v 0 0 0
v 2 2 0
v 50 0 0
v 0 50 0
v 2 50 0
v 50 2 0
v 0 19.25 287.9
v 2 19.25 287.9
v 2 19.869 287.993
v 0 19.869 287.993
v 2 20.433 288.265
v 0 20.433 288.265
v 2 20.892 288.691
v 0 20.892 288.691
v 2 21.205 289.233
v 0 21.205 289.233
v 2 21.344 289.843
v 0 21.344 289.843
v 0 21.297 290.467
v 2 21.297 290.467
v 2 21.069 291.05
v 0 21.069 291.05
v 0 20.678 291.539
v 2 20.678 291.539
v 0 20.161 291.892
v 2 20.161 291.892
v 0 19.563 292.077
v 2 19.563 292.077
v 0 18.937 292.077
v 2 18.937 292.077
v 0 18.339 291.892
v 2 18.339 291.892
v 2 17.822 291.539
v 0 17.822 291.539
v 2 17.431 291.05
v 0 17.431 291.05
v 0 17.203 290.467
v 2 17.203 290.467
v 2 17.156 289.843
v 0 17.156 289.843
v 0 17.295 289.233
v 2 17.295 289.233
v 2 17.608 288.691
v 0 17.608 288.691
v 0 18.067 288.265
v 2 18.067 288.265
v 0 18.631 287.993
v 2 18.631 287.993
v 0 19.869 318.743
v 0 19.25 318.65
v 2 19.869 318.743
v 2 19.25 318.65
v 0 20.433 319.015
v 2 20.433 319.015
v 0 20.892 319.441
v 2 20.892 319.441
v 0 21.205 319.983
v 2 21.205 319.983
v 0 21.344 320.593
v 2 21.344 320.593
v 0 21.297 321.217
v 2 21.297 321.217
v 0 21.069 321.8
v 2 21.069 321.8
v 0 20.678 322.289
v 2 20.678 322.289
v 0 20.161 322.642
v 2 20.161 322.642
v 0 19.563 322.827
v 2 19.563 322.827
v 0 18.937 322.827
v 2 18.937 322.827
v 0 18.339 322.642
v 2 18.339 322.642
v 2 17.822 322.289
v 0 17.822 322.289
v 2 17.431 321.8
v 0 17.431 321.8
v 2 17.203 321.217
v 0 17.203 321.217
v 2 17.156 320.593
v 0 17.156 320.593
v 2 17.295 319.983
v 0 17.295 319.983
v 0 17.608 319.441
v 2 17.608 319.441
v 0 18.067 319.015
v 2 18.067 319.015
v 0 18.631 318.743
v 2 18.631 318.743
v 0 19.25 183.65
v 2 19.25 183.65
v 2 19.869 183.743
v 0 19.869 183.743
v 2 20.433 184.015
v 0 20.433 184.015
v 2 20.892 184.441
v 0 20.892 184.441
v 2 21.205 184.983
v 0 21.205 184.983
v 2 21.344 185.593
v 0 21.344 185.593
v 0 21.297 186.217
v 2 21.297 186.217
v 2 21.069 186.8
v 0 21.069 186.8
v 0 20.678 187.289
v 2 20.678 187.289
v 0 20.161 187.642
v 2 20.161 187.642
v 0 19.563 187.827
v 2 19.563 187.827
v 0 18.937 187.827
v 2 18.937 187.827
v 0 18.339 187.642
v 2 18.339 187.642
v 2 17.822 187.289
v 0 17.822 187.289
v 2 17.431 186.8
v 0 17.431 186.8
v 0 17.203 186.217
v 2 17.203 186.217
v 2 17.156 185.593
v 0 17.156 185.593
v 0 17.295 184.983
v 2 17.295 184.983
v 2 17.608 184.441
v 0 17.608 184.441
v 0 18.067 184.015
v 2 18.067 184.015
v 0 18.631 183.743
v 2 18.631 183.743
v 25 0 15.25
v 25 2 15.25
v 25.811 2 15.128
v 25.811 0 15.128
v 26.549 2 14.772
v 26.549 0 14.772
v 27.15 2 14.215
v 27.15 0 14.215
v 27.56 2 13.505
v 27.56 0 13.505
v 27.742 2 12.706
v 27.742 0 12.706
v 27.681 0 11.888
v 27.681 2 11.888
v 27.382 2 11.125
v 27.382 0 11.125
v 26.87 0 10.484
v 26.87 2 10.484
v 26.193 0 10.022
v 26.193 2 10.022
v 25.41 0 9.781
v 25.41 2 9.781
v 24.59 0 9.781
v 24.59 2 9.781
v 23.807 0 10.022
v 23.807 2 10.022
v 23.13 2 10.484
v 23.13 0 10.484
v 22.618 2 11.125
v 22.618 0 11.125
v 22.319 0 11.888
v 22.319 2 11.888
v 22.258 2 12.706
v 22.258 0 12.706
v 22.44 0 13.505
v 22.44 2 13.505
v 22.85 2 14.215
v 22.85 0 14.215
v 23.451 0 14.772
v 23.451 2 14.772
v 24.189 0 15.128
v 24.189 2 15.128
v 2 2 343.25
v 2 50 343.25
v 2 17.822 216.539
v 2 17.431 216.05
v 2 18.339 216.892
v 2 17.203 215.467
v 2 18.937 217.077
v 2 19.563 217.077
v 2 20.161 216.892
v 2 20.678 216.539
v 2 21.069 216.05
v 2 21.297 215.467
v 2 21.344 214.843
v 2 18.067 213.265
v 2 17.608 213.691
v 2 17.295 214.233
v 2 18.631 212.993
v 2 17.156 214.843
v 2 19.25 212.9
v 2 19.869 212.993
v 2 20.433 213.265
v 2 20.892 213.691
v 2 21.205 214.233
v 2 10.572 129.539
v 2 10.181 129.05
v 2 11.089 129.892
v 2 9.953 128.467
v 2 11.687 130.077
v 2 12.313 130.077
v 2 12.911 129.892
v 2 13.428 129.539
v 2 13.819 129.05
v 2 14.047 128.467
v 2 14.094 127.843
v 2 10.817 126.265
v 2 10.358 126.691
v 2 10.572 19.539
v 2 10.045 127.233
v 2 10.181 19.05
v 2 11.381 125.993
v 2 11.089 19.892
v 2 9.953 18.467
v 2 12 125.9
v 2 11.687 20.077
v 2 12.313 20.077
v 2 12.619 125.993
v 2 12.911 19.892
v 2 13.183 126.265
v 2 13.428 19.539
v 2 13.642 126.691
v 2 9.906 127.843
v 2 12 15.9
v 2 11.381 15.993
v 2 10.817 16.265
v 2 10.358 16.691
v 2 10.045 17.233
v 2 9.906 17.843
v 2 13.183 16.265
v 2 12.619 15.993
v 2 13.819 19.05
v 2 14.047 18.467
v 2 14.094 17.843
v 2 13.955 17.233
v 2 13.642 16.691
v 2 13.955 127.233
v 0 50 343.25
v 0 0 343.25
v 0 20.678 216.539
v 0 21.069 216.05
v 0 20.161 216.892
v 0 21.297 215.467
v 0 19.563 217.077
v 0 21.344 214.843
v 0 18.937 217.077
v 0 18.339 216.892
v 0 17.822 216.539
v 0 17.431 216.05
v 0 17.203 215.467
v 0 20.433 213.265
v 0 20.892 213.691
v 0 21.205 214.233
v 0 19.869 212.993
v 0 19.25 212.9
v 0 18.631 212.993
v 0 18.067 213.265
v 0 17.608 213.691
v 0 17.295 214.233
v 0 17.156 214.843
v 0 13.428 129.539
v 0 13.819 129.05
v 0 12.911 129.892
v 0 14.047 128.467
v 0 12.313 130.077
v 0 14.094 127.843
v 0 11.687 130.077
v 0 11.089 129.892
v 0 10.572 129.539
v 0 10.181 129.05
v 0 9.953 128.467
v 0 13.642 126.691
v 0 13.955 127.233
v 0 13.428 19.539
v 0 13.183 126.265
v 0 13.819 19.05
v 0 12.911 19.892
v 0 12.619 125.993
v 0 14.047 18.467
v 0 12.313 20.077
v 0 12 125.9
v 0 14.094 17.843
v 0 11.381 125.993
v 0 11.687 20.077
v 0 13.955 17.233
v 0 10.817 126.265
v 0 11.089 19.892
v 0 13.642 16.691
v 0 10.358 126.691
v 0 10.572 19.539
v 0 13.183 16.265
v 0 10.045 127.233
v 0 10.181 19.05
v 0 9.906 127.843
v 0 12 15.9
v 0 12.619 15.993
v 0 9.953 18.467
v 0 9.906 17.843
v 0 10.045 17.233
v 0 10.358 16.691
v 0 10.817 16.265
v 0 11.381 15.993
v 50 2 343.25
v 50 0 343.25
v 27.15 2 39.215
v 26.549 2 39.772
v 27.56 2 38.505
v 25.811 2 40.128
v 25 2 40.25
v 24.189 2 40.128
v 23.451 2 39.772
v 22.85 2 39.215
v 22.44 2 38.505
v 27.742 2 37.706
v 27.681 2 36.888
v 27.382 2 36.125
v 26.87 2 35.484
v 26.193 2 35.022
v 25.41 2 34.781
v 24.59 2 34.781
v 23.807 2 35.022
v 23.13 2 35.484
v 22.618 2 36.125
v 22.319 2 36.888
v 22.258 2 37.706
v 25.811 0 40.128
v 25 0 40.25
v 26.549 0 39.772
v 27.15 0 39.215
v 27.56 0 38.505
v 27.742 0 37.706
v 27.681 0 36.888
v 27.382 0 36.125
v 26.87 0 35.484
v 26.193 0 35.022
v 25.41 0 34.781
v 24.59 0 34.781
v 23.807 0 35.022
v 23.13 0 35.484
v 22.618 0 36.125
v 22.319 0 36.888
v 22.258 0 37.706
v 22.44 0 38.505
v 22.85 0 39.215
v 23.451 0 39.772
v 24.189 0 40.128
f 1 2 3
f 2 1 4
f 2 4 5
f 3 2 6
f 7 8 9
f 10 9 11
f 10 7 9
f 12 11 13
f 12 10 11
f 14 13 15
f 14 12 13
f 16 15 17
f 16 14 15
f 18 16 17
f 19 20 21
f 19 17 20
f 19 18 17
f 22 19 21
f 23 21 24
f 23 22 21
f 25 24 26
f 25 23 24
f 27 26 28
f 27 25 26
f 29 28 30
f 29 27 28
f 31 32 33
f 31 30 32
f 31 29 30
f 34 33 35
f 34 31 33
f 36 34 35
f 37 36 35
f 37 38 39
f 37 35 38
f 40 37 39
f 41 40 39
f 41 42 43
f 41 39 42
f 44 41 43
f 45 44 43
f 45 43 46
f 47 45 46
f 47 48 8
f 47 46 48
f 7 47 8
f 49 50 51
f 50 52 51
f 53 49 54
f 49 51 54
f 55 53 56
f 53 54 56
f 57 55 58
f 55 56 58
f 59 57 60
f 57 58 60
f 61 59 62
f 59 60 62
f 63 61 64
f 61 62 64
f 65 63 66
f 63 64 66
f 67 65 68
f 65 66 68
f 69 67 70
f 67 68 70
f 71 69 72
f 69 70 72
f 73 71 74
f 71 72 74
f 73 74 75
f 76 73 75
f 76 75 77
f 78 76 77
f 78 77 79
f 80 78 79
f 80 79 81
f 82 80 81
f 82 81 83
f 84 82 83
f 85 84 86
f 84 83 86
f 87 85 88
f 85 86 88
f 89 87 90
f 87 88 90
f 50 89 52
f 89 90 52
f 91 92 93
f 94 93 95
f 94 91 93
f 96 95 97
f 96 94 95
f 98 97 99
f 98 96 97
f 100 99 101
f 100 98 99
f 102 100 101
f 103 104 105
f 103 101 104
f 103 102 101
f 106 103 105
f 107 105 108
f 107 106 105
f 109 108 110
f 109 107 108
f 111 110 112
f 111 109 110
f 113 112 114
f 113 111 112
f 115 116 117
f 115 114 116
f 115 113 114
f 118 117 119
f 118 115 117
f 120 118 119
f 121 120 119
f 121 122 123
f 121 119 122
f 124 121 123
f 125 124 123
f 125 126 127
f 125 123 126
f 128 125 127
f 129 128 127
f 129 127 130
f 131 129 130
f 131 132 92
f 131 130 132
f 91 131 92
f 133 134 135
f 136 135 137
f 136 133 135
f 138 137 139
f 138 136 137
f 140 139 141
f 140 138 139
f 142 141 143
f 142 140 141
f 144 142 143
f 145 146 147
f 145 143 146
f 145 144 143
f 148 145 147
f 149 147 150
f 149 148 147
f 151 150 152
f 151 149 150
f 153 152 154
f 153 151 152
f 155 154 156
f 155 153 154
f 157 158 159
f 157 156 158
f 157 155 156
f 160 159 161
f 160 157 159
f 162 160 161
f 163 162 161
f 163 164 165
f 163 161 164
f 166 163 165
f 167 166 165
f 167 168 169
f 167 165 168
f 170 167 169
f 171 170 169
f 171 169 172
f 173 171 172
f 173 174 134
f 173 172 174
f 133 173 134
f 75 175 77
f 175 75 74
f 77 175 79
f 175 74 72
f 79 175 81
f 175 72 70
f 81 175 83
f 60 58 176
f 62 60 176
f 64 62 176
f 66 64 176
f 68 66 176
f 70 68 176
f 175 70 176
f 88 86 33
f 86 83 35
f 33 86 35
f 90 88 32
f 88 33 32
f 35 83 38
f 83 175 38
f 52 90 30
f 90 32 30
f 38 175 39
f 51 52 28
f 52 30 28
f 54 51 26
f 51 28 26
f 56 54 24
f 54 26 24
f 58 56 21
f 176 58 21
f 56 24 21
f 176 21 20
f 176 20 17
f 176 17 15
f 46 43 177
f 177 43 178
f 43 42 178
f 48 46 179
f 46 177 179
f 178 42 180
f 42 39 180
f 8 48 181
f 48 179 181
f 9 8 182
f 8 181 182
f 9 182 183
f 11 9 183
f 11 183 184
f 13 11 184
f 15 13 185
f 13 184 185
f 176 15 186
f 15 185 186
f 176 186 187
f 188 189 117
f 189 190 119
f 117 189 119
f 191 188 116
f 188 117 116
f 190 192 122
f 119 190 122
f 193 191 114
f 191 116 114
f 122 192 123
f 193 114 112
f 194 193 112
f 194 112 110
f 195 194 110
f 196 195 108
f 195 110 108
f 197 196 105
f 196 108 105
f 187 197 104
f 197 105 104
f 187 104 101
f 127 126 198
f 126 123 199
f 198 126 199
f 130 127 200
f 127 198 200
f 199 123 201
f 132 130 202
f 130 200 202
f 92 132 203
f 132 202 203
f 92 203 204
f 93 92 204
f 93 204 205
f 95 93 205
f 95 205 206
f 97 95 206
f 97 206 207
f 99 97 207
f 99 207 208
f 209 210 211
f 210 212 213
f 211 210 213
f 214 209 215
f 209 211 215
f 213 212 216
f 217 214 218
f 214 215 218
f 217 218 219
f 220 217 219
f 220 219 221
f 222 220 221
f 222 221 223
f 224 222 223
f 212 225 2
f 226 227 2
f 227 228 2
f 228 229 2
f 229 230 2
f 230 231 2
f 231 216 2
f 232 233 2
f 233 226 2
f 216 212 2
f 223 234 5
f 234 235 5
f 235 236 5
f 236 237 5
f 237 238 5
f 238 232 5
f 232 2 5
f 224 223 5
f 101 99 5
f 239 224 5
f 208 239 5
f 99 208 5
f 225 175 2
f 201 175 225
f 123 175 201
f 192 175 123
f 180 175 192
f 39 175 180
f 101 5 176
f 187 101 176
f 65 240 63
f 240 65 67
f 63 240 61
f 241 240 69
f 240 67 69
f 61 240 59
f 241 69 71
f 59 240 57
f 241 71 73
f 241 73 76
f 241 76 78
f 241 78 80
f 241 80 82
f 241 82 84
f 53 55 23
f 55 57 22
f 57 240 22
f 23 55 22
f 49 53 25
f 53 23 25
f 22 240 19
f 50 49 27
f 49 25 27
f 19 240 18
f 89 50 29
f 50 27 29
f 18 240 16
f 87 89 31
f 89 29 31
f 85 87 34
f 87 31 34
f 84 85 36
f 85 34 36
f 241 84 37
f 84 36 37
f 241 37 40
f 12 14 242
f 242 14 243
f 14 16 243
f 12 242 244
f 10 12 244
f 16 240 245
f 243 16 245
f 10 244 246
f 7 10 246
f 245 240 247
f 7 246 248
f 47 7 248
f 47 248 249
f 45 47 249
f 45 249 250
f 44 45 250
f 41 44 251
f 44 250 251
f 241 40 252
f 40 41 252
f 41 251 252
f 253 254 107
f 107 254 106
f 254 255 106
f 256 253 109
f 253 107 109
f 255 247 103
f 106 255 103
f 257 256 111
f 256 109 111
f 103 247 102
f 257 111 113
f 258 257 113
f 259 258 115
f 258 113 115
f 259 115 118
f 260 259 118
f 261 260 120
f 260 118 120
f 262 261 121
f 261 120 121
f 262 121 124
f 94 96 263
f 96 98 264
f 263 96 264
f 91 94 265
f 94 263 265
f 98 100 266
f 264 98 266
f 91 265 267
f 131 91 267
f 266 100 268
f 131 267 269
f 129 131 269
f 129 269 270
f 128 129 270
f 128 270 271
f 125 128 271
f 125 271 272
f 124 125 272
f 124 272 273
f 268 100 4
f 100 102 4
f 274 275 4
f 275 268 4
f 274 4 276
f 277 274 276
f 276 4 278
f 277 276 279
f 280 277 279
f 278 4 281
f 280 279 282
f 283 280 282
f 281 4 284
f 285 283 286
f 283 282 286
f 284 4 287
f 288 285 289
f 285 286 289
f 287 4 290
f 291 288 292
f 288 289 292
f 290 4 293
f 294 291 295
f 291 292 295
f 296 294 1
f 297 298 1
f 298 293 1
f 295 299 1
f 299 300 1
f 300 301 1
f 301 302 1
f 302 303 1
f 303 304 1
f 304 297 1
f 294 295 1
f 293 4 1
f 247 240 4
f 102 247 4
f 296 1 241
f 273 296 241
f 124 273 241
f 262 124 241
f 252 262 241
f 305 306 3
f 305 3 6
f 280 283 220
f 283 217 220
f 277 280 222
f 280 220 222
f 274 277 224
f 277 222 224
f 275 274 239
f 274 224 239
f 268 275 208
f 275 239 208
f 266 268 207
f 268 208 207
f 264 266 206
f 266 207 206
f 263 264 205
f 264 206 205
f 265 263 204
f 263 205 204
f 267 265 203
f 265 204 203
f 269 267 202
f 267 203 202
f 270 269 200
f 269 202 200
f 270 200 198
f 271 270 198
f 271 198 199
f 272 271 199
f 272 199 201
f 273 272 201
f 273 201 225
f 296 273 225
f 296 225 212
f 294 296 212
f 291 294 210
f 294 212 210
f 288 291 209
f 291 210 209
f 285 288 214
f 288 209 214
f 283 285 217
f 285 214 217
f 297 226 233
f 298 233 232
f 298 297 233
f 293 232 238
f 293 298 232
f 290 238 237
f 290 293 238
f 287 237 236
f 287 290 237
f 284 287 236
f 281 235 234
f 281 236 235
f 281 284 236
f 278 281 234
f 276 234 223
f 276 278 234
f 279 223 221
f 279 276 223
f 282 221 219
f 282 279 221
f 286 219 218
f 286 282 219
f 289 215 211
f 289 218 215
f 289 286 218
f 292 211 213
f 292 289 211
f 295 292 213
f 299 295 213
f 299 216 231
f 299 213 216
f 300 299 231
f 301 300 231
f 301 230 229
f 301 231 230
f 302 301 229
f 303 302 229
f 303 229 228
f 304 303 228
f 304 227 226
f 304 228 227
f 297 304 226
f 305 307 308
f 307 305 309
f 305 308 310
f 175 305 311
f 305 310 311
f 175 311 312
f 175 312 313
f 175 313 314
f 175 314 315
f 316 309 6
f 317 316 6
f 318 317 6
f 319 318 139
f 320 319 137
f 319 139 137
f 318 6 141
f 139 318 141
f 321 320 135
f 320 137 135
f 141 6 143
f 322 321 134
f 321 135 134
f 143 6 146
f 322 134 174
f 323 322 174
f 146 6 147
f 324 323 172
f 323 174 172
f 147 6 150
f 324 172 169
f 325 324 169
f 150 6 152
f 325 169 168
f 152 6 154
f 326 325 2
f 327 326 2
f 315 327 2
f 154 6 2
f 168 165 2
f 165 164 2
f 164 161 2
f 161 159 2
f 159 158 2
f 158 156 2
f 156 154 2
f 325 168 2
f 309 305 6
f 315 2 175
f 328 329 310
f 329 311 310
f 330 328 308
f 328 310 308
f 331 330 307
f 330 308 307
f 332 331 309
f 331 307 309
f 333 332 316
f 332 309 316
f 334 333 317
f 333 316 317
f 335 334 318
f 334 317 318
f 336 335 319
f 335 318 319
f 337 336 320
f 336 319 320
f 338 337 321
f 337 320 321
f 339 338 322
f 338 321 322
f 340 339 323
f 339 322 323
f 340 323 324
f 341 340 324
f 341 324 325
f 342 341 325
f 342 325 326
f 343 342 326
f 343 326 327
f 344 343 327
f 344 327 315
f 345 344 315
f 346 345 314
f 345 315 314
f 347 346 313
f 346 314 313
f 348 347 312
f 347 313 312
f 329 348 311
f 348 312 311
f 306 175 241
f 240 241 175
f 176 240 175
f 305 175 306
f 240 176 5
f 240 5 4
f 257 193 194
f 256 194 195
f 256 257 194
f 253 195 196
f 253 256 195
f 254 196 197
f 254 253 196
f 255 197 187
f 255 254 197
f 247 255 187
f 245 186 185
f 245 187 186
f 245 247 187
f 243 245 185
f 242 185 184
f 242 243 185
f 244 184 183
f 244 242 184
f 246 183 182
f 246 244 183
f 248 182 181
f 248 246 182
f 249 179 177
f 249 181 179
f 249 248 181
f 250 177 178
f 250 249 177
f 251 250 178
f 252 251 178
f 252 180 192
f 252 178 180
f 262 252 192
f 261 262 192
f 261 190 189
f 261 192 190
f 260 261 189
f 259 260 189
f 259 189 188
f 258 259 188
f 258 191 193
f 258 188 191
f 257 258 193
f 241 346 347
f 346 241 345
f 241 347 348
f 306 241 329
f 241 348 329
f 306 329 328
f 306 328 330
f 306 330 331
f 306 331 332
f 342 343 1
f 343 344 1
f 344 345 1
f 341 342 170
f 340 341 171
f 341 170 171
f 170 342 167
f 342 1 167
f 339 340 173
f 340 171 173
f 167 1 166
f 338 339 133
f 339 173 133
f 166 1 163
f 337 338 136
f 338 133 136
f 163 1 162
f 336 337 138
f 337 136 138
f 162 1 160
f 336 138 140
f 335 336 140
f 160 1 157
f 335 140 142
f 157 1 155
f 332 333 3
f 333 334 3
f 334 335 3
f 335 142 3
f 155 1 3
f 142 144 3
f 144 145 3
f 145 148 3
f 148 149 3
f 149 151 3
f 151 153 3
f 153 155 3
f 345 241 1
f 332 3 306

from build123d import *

# Parameters (mm, degrees)
BOSS_EXTRUDE1_DEPTH = 343.25
SKETCH2_R           = 2.1
CUT_EXTRUDE1_DEPTH  = 5
SKETCH3_R           = 2.1
CUT_EXTRUDE2_DEPTH  = 5
SKETCH4_R           = 2.75
CUT_EXTRUDE3_DEPTH  = 5


with BuildPart() as part:
    # Sketch1 → Boss-Extrude1 (new body)
    with BuildSketch(Plane.XY):
        Polygon((0, 0), (50, 0), (50, 2), (2, 2), (2, 50), (0, 50), align=None)
    extrude(amount=BOSS_EXTRUDE1_DEPTH)

    # Sketch2 → Cut-Extrude1 (cut, symmetric)
    with BuildSketch(Plane(origin=(0, 0, 0), x_dir=(0, 0, -1), z_dir=(1, 0, 0))):
        with Locations((-185.75, 19.25)):
            Circle(SKETCH2_R)
        with Locations((-215, 19.25)):
            Circle(SKETCH2_R)
        with Locations((-290, 19.25)):
            Circle(SKETCH2_R)
        with Locations((-320.75, 19.25)):
            Circle(SKETCH2_R)
    extrude(amount=CUT_EXTRUDE1_DEPTH, both=True, mode=Mode.SUBTRACT)

    # Sketch3 → Cut-Extrude2 (cut, symmetric)
    with BuildSketch(Plane(origin=(0, 0, 0), x_dir=(0, 0, -1), z_dir=(1, 0, 0))):
        with Locations((-18, 12)):
            Circle(SKETCH3_R)
        with Locations((-128, 12)):
            Circle(SKETCH3_R)
    extrude(amount=CUT_EXTRUDE2_DEPTH, both=True, mode=Mode.SUBTRACT)

    # Sketch4 → Cut-Extrude3 (cut, symmetric)
    with BuildSketch(Plane(origin=(0, 0, 0), x_dir=(1, 0, 0), z_dir=(0, 1, 0))):
        with Locations(Location((25, -12.5, 0), (0, 0, 270))):
            Circle(SKETCH4_R)
        with Locations(Location((25, -37.5, 0), (0, 0, 270))):
            Circle(SKETCH4_R)
    extrude(amount=CUT_EXTRUDE3_DEPTH, both=True, mode=Mode.SUBTRACT)


solid = part.part
